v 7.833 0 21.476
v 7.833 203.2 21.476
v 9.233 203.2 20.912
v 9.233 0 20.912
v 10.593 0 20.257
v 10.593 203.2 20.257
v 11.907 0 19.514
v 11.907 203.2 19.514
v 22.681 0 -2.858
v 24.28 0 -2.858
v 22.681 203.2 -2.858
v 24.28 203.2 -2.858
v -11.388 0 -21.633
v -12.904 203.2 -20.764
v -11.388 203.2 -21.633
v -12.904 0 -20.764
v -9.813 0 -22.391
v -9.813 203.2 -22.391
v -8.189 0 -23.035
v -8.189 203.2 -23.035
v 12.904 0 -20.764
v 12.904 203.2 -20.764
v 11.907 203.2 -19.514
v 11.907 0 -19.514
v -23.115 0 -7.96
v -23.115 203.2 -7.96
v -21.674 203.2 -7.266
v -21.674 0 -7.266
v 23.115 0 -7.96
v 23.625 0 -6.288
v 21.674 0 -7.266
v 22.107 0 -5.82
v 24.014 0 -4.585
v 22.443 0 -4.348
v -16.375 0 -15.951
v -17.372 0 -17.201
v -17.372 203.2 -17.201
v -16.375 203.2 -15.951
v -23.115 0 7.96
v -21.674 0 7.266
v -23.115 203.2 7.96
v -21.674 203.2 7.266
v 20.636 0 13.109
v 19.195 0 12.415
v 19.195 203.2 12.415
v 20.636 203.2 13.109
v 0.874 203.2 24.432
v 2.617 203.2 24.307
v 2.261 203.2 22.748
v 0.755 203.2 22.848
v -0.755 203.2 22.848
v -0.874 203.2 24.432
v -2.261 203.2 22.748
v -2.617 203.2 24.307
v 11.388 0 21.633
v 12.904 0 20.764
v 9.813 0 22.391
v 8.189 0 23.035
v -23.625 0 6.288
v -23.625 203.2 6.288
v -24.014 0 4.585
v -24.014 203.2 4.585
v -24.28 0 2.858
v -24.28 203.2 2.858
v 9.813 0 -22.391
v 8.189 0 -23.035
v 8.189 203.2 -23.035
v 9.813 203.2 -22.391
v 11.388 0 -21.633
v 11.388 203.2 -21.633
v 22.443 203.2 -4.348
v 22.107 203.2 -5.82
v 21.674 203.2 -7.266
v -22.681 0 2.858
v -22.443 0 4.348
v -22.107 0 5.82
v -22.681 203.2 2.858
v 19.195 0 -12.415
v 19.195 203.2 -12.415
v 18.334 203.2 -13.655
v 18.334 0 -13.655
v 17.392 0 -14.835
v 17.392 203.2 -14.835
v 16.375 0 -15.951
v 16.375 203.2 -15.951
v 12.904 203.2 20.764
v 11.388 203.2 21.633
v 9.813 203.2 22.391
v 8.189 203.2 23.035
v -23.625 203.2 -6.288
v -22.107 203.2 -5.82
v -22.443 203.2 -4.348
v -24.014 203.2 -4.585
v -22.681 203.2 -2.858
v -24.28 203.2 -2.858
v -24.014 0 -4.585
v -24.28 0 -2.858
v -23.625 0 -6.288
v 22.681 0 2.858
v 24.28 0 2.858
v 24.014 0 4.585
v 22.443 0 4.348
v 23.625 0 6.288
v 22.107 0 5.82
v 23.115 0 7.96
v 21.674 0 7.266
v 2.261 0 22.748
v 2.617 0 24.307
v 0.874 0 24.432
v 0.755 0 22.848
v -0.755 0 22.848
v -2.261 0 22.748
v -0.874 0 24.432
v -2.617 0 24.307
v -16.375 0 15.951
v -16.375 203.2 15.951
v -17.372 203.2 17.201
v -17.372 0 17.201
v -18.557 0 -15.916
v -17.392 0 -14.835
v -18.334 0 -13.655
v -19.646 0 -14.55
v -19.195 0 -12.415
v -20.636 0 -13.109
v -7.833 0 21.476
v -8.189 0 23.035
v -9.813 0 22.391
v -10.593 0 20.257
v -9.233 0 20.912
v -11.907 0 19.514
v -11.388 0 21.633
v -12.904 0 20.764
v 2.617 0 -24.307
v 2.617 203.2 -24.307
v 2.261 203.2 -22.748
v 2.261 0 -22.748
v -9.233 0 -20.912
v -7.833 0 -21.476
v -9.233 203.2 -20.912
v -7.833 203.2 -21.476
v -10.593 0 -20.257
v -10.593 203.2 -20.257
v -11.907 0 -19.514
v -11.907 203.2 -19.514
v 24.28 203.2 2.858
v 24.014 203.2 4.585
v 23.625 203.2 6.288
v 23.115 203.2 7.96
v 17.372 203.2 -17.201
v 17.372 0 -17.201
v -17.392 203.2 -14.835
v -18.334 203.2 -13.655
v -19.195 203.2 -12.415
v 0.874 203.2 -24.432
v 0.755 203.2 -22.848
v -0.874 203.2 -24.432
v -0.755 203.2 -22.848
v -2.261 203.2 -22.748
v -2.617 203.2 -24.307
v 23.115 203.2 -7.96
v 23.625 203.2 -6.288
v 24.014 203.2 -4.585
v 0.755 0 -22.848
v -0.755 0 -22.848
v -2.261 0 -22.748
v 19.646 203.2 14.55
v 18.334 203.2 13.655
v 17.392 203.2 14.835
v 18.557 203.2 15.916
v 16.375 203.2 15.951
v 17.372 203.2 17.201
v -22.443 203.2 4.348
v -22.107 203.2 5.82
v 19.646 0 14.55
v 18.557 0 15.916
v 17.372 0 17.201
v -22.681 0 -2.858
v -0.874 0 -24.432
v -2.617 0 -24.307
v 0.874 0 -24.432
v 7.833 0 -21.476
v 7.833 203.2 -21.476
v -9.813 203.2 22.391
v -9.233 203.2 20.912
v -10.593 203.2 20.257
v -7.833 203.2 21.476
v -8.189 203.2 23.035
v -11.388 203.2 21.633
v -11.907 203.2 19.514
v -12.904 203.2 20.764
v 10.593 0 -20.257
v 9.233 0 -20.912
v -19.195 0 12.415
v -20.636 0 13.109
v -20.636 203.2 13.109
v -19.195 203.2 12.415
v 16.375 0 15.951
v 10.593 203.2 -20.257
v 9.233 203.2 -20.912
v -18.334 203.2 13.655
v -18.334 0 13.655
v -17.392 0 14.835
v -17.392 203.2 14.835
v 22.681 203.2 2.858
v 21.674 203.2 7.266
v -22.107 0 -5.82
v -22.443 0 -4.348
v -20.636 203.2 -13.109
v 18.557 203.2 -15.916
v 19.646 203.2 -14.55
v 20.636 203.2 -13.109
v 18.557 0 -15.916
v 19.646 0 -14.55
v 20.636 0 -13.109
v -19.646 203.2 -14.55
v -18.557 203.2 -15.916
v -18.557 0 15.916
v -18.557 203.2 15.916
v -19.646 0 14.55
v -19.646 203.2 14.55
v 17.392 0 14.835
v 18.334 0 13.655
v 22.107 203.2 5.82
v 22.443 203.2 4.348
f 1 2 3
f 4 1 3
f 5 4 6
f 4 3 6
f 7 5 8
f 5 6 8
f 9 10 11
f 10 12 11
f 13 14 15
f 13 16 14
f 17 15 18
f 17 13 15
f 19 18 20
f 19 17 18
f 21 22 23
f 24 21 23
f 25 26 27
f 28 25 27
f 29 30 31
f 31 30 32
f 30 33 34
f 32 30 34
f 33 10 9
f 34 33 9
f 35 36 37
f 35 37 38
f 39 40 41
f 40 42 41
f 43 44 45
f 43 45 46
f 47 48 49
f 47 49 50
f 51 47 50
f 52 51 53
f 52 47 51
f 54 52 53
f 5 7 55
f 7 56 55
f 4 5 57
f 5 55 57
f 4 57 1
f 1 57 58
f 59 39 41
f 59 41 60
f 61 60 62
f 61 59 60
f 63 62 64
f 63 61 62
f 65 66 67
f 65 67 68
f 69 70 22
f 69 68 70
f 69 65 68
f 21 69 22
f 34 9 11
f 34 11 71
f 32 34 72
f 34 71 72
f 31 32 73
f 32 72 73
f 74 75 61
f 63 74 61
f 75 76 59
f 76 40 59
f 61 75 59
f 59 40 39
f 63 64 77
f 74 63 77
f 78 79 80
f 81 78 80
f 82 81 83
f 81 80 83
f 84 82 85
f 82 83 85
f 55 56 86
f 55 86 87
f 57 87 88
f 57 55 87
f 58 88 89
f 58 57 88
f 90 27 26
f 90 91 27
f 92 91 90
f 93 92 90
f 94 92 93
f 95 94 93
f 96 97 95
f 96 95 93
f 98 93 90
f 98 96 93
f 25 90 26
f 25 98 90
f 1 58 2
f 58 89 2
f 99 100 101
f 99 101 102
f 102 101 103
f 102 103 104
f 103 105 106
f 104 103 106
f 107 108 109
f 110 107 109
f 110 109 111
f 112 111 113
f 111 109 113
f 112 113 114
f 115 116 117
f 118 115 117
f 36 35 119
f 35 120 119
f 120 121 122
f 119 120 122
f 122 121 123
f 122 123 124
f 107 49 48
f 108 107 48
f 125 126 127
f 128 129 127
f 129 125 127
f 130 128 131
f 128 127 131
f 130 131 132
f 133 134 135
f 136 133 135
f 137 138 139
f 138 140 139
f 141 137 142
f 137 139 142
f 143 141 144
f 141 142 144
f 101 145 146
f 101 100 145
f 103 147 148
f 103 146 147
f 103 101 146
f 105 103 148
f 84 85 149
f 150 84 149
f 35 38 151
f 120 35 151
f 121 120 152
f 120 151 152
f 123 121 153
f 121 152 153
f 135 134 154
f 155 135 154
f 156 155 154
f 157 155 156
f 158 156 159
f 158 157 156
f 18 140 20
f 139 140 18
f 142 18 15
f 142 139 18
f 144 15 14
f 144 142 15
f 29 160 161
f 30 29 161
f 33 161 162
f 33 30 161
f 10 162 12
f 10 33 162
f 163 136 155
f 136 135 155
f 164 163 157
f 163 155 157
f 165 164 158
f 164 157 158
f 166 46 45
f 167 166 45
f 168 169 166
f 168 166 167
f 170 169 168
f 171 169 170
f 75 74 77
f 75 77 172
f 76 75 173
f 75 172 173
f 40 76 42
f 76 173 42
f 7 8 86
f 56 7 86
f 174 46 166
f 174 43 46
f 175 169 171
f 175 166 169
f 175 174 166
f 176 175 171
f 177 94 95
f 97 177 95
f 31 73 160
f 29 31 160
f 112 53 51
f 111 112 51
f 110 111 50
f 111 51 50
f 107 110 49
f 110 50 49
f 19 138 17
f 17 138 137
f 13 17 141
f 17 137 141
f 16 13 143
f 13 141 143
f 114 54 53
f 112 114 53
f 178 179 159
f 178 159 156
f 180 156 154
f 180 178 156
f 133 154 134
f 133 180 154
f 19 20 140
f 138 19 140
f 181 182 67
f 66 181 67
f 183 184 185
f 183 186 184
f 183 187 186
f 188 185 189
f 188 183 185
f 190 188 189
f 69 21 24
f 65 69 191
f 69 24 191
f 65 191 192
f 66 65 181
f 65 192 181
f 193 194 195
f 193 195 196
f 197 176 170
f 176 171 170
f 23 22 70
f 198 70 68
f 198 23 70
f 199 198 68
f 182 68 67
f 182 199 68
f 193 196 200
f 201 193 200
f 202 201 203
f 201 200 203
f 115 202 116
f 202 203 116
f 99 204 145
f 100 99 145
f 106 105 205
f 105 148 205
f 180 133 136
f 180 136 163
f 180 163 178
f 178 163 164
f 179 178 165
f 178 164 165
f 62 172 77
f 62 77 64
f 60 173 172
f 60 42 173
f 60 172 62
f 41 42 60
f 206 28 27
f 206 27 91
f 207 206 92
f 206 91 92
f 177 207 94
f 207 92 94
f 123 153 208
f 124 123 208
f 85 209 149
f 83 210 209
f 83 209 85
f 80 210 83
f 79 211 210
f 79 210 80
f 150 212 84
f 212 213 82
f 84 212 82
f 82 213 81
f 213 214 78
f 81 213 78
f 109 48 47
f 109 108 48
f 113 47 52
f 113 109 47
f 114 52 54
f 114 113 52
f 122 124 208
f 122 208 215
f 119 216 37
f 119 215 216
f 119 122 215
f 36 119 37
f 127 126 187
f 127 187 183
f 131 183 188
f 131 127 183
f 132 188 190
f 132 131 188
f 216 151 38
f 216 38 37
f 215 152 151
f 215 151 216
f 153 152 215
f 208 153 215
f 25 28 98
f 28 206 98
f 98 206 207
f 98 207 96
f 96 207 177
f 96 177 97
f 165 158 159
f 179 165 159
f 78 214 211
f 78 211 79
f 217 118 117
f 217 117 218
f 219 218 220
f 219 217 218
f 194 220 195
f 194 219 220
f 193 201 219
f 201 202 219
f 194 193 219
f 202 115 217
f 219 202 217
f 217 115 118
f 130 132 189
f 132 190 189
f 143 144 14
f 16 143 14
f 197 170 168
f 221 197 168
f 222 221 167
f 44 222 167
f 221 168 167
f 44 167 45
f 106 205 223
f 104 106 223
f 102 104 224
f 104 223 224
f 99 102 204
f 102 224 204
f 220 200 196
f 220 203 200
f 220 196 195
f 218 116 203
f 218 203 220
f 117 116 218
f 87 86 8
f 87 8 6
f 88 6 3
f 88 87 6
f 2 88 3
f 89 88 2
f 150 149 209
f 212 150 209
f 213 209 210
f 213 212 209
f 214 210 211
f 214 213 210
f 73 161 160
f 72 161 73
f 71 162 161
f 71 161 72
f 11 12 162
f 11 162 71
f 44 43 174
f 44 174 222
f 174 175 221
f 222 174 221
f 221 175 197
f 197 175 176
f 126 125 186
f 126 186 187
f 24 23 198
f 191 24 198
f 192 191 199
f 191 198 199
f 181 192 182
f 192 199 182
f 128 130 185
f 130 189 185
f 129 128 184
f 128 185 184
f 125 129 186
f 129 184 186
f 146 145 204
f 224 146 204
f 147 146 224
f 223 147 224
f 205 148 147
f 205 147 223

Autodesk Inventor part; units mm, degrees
ref_plane "YZ Plane" through (0, 0, 0) normal (1, 0, 0) x (0, 1, 0)
ref_plane "XZ Plane" through (0, 0, 0) normal (0, 1, 0) x (-1, 0, 0)
ref_plane "XY Plane" through (0, 0, 0) normal (0, 0, 1) x (1, 0, 0)
sketch "Sketch1" plane through (0, 0, 0) normal (0, 1, 0) x (-1, 0, 0)
  circle A0 centre (0, 0) radius 24.4475
  dimension "d0" = 48.895
extrude "Extrusion1" add sketch "Sketch1" along normal blind 203.2
sketch "Sketch2" plane through (0, 203.2, 0) normal (0, 1, 0) x (1, 0, 0)
  circle A0 centre (0, 0) radius 22.86
  dimension "d3" = 45.72
extrude "Extrusion2" cut sketch "Sketch2" against normal through all
sketch "Sketch3" plane through (0, 203.2, 0) normal (0, 1, 0) x (1, 0, 0)
  line L0 (-25.4, -2.8575) -> (-12.7, -2.8575)
  line L1 (-12.7, -2.8575) -> (-12.7, 2.8575)
  line L2 (-12.7, 2.8575) -> (-25.4, 2.8575)
  line L3 (-25.4, 2.8575) -> (-25.4, -2.8575)
  line L4 (-21.6448, -13.5952) -> (-10.2025, -8.0848)
  line L5 (-10.2025, -8.0848) -> (-12.6821, -2.9358)
  line L6 (-12.6821, -2.9358) -> (-24.1244, -8.4461)
  line L7 (-24.1244, -8.4461) -> (-21.6448, -13.5952)
  line L8 (-13.6026, -21.6401) -> (-5.6842, -11.7109)
  line L9 (-5.6842, -11.7109) -> (-10.1524, -8.1476)
  line L10 (-10.1524, -8.1476) -> (-18.0707, -18.0769)
  line L11 (-18.0707, -18.0769) -> (-13.6026, -21.6401)
  line L12 (-2.8662, -25.399) -> (-0.0402, -13.0174)
  line L13 (-0.0402, -13.0174) -> (-5.6119, -11.7457)
  line L14 (-5.6119, -11.7457) -> (-8.4379, -24.1273)
  line L15 (-8.4379, -24.1273) -> (-2.8662, -25.399)
  line L16 (8.4379, -24.1273) -> (5.6119, -11.7457)
  line L17 (5.6119, -11.7457) -> (0.0402, -13.0174)
  line L18 (0.0402, -13.0174) -> (2.8662, -25.399)
  line L19 (2.8662, -25.399) -> (8.4379, -24.1273)
  line L20 (18.0707, -18.0769) -> (10.1524, -8.1476)
  line L21 (10.1524, -8.1476) -> (5.6842, -11.7109)
  line L22 (5.6842, -11.7109) -> (13.6026, -21.6401)
  line L23 (13.6026, -21.6401) -> (18.0707, -18.0769)
  line L24 (24.1244, -8.4461) -> (12.6821, -2.9358)
  line L25 (12.6821, -2.9358) -> (10.2025, -8.0848)
  line L26 (10.2025, -8.0848) -> (21.6448, -13.5952)
  line L27 (21.6448, -13.5952) -> (24.1244, -8.4461)
  line L28 (25.4, 2.8575) -> (12.7, 2.8575)
  line L29 (12.7, 2.8575) -> (12.7, -2.8575)
  line L30 (12.7, -2.8575) -> (25.4, -2.8575)
  line L31 (25.4, -2.8575) -> (25.4, 2.8575)
  circle A0 centre (0, 0) radius 24.4475 projected
  line L32 (21.6448, 13.5952) -> (10.2025, 8.0848)
  line L33 (10.2025, 8.0848) -> (12.6821, 2.9358)
  line L34 (12.6821, 2.9358) -> (24.1244, 8.4461)
  line L35 (24.1244, 8.4461) -> (21.6448, 13.5952)
  line L36 (13.6026, 21.6401) -> (5.6842, 11.7109)
  line L37 (5.6842, 11.7109) -> (10.1524, 8.1476)
  line L38 (10.1524, 8.1476) -> (18.0707, 18.0769)
  line L39 (18.0707, 18.0769) -> (13.6026, 21.6401)
  line L40 (2.8662, 25.399) -> (0.0402, 13.0174)
  line L41 (0.0402, 13.0174) -> (5.6119, 11.7457)
  line L42 (5.6119, 11.7457) -> (8.4379, 24.1273)
  line L43 (8.4379, 24.1273) -> (2.8662, 25.399)
  line L44 (-8.4379, 24.1273) -> (-5.6119, 11.7457)
  line L45 (-5.6119, 11.7457) -> (-0.0402, 13.0174)
  line L46 (-0.0402, 13.0174) -> (-2.8662, 25.399)
  line L47 (-2.8662, 25.399) -> (-8.4379, 24.1273)
  line L48 (-18.0707, 18.0769) -> (-10.1524, 8.1476)
  line L49 (-10.1524, 8.1476) -> (-5.6842, 11.7109)
  line L50 (-5.6842, 11.7109) -> (-13.6026, 21.6401)
  line L51 (-13.6026, 21.6401) -> (-18.0707, 18.0769)
  line L52 (-24.1244, 8.4461) -> (-12.6821, 2.9358)
  line L53 (-12.6821, 2.9358) -> (-10.2025, 8.0848)
  line L54 (-10.2025, 8.0848) -> (-21.6448, 13.5952)
  line L55 (-21.6448, 13.5952) -> (-24.1244, 8.4461)
  point P0 (-30.1625, 0)
  point P1 (-27.1755, -13.087)
  point P2 (-18.806, -23.582)
  point P3 (-6.7118, -29.4063)
  point P4 (6.7118, -29.4063)
  point P5 (18.806, -23.582)
  point P6 (27.1755, -13.087)
  point P7 (30.1625, 0)
  point P8 (27.1755, 13.087)
  point P9 (18.806, 23.582)
  point P10 (6.7118, 29.4063)
  point P11 (-6.7118, 29.4063)
  point P12 (-18.806, 23.582)
  point P13 (-27.1755, 13.087)
  dimension "d13" = 360
  dimension "d16" = 12.7
extrude "Extrusion3" cut sketch "Sketch3" against normal through all contours L3 L2 A0 L0 | A0 L2 L1 L0 | A0 L4 L7 L6 | L6 L5 L4 A0 | L52 L55 L54 A0 | A0 L54 L53 L52 | A0 L8 L11 L10 | L10 L9 L8 A0 | L48 L51 L50 A0 | A0 L50 L49 L48 | A0 L12 L15 L14 | L14 L13 L12 A0 | L44 L47 L46 A0 | A0 L46 L45 L44 | A0 L16 L19 L18 | L18 L17 L16 A0 | L40 L43 L42 A0 | A0 L42 L41 L40 | A0 L20 L23 L22 | L22 L21 L20 A0 | L36 L39 L38 A0 | A0 L38 L37 L36 | A0 L24 L27 L26 | L26 L25 L24 A0 | L32 L35 L34 A0 | A0 L34 L33 L32 | A0 L28 L31 L30 | L30 L29 L28 A0
properties part number "bandspreroller"
